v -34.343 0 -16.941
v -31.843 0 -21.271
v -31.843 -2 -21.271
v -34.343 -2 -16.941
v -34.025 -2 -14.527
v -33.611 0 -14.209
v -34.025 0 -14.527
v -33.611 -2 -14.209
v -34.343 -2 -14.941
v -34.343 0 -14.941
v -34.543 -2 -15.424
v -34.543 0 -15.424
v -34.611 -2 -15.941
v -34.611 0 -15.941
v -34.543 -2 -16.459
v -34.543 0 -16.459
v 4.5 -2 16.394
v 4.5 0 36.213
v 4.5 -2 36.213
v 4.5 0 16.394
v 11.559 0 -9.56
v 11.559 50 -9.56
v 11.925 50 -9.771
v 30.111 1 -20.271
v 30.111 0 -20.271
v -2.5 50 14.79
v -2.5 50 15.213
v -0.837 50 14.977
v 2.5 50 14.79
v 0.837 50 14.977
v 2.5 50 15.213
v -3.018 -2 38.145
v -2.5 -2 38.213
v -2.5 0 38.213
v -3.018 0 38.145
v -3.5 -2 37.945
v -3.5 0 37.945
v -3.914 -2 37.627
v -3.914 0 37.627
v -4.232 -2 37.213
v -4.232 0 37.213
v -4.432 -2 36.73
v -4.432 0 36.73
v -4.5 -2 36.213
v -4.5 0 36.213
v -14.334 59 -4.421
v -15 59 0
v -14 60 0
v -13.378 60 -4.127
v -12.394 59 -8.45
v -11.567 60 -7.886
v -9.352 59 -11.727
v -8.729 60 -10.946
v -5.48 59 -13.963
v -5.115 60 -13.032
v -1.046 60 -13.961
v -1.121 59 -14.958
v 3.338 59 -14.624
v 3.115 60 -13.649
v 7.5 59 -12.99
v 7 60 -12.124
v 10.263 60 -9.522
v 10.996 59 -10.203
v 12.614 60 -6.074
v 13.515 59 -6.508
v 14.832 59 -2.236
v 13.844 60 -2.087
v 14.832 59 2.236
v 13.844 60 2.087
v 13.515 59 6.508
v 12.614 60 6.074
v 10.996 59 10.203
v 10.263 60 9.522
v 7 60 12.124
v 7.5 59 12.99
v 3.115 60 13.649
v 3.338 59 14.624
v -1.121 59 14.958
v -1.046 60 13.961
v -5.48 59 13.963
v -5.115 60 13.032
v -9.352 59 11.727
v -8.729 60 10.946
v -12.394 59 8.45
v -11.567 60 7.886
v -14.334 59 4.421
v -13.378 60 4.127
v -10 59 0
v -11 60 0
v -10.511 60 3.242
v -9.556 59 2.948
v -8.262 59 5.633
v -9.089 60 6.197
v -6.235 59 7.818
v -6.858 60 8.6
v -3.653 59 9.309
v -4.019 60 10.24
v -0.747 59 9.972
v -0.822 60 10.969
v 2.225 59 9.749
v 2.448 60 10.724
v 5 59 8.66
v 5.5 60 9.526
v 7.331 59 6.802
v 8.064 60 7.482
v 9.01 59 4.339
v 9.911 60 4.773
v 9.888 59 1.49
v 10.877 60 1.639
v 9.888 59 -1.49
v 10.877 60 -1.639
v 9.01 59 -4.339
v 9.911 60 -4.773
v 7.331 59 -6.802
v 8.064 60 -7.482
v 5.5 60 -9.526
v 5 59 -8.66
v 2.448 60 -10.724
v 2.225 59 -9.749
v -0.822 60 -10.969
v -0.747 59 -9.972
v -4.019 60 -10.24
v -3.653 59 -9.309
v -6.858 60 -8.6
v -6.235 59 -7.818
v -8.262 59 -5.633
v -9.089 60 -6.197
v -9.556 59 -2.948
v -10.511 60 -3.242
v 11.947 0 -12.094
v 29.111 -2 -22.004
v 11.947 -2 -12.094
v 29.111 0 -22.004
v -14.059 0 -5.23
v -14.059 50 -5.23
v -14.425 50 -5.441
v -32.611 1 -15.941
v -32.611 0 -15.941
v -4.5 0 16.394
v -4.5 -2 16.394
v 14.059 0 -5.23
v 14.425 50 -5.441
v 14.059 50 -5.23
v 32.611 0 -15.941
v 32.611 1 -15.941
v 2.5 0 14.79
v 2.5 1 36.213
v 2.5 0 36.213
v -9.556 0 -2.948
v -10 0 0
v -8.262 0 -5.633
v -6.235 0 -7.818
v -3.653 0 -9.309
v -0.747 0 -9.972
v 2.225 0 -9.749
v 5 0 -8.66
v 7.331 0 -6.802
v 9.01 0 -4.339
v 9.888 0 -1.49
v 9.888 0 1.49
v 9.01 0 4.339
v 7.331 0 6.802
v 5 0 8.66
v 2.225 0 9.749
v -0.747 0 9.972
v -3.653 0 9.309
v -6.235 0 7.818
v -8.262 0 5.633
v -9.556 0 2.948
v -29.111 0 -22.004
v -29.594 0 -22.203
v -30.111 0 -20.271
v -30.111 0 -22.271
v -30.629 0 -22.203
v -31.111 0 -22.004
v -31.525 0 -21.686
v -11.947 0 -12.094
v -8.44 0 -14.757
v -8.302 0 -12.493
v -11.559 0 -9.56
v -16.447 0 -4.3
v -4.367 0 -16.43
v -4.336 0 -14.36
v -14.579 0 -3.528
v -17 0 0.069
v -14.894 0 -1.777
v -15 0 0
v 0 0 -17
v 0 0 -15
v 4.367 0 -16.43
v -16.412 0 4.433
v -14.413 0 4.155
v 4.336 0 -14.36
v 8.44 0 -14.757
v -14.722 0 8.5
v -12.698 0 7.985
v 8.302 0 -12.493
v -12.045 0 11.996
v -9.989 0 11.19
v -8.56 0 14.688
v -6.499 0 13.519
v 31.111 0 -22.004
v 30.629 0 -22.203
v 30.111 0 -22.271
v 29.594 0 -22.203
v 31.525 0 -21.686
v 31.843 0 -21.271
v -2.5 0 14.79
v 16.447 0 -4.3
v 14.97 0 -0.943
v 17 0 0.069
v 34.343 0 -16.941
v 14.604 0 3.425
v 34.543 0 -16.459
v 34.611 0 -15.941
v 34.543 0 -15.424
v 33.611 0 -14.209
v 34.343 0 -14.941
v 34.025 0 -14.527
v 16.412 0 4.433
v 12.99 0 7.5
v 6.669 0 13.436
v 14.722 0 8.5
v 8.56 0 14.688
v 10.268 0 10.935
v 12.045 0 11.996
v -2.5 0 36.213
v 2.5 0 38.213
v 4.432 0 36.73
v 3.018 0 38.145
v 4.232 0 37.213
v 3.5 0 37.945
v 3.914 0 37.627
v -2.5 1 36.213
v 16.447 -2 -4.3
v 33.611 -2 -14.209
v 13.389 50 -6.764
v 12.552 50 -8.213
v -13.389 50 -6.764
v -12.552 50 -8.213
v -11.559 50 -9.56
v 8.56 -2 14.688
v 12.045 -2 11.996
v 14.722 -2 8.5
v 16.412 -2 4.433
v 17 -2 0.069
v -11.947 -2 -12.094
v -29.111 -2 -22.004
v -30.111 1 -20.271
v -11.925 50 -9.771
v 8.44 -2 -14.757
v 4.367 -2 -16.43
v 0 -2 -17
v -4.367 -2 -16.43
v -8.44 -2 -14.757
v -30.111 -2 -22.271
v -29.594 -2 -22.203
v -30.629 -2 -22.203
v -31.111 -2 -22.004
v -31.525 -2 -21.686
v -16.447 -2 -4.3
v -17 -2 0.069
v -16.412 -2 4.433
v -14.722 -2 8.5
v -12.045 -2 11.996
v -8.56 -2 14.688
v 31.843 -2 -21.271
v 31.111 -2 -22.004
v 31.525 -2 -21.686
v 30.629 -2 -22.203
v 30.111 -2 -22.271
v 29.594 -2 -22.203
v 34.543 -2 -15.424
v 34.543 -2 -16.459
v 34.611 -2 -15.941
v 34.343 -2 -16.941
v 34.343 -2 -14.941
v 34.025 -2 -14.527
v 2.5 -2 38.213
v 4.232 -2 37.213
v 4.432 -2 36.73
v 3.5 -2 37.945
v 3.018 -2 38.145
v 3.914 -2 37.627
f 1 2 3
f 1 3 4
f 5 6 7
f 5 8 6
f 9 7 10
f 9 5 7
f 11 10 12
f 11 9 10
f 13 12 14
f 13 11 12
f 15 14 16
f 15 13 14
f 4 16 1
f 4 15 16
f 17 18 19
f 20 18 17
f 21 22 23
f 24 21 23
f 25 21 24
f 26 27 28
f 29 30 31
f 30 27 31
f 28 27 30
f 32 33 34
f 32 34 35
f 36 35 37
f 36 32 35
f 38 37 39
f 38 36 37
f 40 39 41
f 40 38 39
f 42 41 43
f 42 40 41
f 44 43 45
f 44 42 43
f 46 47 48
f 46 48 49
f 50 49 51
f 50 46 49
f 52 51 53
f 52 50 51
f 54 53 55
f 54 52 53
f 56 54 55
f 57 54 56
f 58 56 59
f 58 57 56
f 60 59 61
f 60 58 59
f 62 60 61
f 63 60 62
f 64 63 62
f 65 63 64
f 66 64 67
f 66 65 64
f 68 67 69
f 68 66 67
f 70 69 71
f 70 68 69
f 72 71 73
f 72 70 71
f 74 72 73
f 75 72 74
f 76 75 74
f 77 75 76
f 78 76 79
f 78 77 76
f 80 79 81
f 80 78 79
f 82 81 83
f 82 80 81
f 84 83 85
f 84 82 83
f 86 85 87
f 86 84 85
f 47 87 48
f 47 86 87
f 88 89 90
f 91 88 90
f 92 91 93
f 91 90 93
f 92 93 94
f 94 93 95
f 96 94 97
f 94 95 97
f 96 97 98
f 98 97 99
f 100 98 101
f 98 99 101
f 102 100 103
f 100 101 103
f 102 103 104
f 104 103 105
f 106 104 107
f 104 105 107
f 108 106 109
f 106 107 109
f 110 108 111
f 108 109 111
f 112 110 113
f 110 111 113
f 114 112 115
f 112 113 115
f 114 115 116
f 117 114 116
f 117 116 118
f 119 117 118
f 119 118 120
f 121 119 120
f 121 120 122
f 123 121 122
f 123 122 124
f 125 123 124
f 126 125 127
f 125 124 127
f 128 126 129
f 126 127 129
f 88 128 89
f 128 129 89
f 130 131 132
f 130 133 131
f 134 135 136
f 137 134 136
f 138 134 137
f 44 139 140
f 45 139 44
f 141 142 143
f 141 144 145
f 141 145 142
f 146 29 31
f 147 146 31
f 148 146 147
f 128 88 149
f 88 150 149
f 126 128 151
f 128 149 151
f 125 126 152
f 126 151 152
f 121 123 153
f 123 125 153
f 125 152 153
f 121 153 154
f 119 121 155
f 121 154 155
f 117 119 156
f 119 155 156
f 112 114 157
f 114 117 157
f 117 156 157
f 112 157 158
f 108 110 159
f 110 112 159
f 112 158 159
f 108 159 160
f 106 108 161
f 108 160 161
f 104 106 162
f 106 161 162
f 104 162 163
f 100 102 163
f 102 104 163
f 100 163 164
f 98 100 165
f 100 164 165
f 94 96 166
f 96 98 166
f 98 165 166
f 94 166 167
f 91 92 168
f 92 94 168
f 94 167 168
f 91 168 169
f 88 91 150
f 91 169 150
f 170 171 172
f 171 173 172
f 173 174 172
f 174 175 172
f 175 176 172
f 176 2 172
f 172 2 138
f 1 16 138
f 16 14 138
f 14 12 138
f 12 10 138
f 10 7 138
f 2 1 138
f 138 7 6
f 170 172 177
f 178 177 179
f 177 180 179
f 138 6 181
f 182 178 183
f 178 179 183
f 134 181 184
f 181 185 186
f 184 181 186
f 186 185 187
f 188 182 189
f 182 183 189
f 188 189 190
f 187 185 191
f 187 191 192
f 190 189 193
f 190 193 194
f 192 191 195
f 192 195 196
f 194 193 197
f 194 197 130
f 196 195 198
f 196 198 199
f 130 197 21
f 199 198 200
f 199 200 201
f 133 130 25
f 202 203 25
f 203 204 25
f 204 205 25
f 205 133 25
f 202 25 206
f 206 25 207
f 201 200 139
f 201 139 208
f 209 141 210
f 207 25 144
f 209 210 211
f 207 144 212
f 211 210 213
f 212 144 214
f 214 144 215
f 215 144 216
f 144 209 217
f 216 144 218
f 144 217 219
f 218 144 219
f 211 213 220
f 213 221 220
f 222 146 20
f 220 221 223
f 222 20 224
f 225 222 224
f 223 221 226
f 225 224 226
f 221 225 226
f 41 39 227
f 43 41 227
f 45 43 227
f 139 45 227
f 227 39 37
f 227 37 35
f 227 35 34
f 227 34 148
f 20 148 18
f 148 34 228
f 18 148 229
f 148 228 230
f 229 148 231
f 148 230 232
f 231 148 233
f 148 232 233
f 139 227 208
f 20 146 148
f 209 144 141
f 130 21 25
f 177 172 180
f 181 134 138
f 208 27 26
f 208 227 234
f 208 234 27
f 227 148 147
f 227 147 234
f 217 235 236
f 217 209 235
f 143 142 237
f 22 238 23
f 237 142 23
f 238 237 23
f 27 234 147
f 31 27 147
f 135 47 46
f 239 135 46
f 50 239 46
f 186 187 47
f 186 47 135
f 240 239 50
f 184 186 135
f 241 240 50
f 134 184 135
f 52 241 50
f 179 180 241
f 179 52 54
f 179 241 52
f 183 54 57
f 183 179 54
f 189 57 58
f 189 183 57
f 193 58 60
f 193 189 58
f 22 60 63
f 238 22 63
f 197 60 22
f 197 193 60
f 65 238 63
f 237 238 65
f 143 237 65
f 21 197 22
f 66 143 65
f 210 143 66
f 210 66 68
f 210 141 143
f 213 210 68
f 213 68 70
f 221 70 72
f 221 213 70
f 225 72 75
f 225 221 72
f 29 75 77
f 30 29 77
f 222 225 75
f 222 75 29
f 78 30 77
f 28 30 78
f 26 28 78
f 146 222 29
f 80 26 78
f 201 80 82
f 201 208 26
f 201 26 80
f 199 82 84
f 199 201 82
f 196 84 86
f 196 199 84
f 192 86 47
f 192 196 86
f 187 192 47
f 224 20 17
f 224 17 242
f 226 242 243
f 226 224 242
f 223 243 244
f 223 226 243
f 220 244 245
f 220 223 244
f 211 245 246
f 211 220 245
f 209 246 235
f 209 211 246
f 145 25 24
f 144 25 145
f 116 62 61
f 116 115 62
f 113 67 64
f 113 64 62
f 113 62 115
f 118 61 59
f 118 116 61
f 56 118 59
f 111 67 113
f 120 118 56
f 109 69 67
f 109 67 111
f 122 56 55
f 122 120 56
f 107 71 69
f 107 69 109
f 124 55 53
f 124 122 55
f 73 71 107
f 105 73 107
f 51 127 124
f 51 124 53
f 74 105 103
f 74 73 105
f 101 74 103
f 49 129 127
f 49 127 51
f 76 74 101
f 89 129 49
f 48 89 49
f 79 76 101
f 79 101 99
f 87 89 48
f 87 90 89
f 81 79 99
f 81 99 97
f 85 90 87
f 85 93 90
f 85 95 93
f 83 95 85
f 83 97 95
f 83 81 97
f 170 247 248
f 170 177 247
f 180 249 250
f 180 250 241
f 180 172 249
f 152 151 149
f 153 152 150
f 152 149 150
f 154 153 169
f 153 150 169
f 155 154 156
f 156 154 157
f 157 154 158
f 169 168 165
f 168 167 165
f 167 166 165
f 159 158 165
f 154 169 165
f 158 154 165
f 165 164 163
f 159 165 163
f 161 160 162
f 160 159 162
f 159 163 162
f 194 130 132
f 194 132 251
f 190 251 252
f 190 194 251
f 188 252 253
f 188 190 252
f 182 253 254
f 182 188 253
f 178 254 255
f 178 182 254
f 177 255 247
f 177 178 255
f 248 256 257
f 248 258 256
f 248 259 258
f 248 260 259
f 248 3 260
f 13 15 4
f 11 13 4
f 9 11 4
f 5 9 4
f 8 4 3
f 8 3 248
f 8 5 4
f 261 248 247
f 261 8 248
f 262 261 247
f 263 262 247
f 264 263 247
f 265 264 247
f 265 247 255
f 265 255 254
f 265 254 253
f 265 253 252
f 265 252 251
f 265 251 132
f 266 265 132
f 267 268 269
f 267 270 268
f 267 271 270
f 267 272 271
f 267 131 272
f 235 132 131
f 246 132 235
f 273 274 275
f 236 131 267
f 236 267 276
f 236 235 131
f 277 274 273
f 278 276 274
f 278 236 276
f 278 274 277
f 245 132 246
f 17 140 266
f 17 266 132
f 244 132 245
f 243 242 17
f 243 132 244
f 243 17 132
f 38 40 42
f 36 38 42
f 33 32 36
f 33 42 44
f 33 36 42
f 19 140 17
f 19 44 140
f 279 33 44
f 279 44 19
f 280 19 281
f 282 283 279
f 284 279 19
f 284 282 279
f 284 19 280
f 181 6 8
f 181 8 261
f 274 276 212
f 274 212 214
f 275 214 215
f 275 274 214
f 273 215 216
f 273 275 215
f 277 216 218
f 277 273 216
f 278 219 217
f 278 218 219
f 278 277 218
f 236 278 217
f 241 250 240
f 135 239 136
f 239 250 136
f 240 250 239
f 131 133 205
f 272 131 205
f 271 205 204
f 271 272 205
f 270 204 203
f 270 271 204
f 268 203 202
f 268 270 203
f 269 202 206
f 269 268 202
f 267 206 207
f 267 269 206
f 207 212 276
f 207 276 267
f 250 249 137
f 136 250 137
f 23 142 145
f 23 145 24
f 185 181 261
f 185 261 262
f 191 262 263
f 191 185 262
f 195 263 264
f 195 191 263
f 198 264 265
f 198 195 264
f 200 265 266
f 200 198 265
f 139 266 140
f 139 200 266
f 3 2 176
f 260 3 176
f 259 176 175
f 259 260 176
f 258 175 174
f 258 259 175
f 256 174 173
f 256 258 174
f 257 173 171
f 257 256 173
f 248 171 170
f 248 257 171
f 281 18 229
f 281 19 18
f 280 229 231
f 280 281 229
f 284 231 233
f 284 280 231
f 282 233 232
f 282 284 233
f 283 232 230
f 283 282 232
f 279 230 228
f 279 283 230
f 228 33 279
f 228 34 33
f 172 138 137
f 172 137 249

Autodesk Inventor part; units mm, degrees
ref_plane "YZ Plane" through (0, 0, 0) normal (1, 0, 0) x (0, 1, 0)
ref_plane "XZ Plane" through (0, 0, 0) normal (0, 1, 0) x (-1, 0, 0)
ref_plane "XY Plane" through (0, 0, 0) normal (0, 0, 1) x (1, 0, 0)
sketch "Szkic1" plane through (0, 0, 0) normal (0, 1, 0) x (-1, 0, 0)
  circle A0 centre (0, 0) radius 10
  circle A1 centre (0, 0) radius 15
  dimension "d0" = 20
  dimension "d1" = 30
extrude "Wyciągnięcie proste1" add sketch "Szkic1" along normal blind 60
sketch "Szkic2" plane through (0, 0, 0) normal (0, -1, 0) x (1, 0, 0)
  line L0 (2.5, 36.2128) -> (-2.5, 36.2128)
  line L1 (-2.5, 36.2128) -> (-2.5, 11.2128)
  line L2 (-2.5, 11.2128) -> (2.5, 11.2128)
  line L3 (2.5, 11.2128) -> (2.5, 36.2128)
  line L4 (2.5, 36.2128) -> (-2.5, 11.2128) construction
  line L5 (-2.5, 36.2128) -> (2.5, 11.2128) construction
  point P0 (0, 0)
  point P1 (0, 23.7128)
  dimension "d4" = 5
  dimension "d5" = 25
extrude "Wyciągnięcie proste2" add sketch "Szkic2" against normal blind 50
chamfer "Faza1" distance 21 distance2 49 1 edges at (0, 50, 36.2128) measured on face at (-0.2789, 50, 29.1341)
pattern_circular "Szyk kołowy1" count 3 over 360 about axis through (0, 0, 0) along (0, 1, 0) of "Faza1", "Wyciągnięcie proste2"
sketch "Szkic3" plane through (0, 0, 0) normal (0, -1, 0) x (1, 0, 0)
  arc A0 (-11.5587, -9.5602) -> (11.5587, -9.5602) centre (0, 0) ccw projected
  line L0 (11.5587, -9.5602) -> (30.1112, -20.2715) projected
  line L1 (30.1112, -20.2715) -> (32.6112, -15.9413) projected
  line L2 (32.6112, -15.9413) -> (14.0587, -5.23) projected
  arc A1 (14.0587, -5.23) -> (2.5, 14.7902) centre (0, 0) ccw projected
  line L3 (2.5, 14.7902) -> (2.5, 36.2128) projected
  line L4 (2.5, 36.2128) -> (-2.5, 36.2128) projected
  line L5 (-2.5, 36.2128) -> (-2.5, 14.7902) projected
  arc A2 (-2.5, 14.7902) -> (-14.0587, -5.23) centre (0, 0) ccw projected
  line L6 (-14.0587, -5.23) -> (-32.6112, -15.9413) projected
  line L7 (-32.6112, -15.9413) -> (-30.1112, -20.2715) projected
  line L8 (-30.1112, -20.2715) -> (-11.5587, -9.5602) projected
  circle A3 centre (0, 0) radius 10 projected
  arc A4 (16.4473, -4.2997) -> (4.5, 16.3936) centre (0, 0) ccw
  line L9 (16.4473, -4.2997) -> (35.3433, -15.2093)
  line L10 (35.3433, -15.2093) -> (30.8433, -23.0035)
  line L11 (30.8433, -23.0035) -> (11.9473, -12.0939)
  arc A5 (-11.9473, -12.0939) -> (11.9473, -12.0939) centre (0, 0) ccw
  line L12 (-11.9473, -12.0939) -> (-30.8433, -23.0035)
  line L13 (-30.8433, -23.0035) -> (-35.3433, -15.2093)
  line L14 (-35.3433, -15.2093) -> (-16.4473, -4.2997)
  arc A6 (-4.5, 16.3936) -> (-16.4473, -4.2997) centre (0, 0) ccw
  line L15 (-4.5, 16.3936) -> (-4.5, 38.2128)
  line L16 (-4.5, 38.2128) -> (4.5, 38.2128)
  line L17 (4.5, 38.2128) -> (4.5, 16.3936)
  dimension "d14" = 2
extrude "Wyciągnięcie proste3" add sketch "Szkic3" along normal blind 2 contours L8 L7 L6 A2 L5 L4 L3 A1 L2 L1 L0 A0 | A3 | L9 L10 L11 A5 L12 L13 L14 A6 L15 L16 L17 A4
fillet "Zaokrąglenie1" radius 2 6 edges at (35.3433, -1, -15.2093) (30.8433, -1, -23.0035) (-30.8433, -1, -23.0035) (-35.3433, -1, -15.2093) (-4.5, -1, 38.2128) (4.5, -1, 38.2128)
chamfer "Faza2" distance 1 angle 45 2 edges at (15, 60, 0) (10, 60, 0)
properties part number "stojak" material "Polietylen, o małej gęstości"
